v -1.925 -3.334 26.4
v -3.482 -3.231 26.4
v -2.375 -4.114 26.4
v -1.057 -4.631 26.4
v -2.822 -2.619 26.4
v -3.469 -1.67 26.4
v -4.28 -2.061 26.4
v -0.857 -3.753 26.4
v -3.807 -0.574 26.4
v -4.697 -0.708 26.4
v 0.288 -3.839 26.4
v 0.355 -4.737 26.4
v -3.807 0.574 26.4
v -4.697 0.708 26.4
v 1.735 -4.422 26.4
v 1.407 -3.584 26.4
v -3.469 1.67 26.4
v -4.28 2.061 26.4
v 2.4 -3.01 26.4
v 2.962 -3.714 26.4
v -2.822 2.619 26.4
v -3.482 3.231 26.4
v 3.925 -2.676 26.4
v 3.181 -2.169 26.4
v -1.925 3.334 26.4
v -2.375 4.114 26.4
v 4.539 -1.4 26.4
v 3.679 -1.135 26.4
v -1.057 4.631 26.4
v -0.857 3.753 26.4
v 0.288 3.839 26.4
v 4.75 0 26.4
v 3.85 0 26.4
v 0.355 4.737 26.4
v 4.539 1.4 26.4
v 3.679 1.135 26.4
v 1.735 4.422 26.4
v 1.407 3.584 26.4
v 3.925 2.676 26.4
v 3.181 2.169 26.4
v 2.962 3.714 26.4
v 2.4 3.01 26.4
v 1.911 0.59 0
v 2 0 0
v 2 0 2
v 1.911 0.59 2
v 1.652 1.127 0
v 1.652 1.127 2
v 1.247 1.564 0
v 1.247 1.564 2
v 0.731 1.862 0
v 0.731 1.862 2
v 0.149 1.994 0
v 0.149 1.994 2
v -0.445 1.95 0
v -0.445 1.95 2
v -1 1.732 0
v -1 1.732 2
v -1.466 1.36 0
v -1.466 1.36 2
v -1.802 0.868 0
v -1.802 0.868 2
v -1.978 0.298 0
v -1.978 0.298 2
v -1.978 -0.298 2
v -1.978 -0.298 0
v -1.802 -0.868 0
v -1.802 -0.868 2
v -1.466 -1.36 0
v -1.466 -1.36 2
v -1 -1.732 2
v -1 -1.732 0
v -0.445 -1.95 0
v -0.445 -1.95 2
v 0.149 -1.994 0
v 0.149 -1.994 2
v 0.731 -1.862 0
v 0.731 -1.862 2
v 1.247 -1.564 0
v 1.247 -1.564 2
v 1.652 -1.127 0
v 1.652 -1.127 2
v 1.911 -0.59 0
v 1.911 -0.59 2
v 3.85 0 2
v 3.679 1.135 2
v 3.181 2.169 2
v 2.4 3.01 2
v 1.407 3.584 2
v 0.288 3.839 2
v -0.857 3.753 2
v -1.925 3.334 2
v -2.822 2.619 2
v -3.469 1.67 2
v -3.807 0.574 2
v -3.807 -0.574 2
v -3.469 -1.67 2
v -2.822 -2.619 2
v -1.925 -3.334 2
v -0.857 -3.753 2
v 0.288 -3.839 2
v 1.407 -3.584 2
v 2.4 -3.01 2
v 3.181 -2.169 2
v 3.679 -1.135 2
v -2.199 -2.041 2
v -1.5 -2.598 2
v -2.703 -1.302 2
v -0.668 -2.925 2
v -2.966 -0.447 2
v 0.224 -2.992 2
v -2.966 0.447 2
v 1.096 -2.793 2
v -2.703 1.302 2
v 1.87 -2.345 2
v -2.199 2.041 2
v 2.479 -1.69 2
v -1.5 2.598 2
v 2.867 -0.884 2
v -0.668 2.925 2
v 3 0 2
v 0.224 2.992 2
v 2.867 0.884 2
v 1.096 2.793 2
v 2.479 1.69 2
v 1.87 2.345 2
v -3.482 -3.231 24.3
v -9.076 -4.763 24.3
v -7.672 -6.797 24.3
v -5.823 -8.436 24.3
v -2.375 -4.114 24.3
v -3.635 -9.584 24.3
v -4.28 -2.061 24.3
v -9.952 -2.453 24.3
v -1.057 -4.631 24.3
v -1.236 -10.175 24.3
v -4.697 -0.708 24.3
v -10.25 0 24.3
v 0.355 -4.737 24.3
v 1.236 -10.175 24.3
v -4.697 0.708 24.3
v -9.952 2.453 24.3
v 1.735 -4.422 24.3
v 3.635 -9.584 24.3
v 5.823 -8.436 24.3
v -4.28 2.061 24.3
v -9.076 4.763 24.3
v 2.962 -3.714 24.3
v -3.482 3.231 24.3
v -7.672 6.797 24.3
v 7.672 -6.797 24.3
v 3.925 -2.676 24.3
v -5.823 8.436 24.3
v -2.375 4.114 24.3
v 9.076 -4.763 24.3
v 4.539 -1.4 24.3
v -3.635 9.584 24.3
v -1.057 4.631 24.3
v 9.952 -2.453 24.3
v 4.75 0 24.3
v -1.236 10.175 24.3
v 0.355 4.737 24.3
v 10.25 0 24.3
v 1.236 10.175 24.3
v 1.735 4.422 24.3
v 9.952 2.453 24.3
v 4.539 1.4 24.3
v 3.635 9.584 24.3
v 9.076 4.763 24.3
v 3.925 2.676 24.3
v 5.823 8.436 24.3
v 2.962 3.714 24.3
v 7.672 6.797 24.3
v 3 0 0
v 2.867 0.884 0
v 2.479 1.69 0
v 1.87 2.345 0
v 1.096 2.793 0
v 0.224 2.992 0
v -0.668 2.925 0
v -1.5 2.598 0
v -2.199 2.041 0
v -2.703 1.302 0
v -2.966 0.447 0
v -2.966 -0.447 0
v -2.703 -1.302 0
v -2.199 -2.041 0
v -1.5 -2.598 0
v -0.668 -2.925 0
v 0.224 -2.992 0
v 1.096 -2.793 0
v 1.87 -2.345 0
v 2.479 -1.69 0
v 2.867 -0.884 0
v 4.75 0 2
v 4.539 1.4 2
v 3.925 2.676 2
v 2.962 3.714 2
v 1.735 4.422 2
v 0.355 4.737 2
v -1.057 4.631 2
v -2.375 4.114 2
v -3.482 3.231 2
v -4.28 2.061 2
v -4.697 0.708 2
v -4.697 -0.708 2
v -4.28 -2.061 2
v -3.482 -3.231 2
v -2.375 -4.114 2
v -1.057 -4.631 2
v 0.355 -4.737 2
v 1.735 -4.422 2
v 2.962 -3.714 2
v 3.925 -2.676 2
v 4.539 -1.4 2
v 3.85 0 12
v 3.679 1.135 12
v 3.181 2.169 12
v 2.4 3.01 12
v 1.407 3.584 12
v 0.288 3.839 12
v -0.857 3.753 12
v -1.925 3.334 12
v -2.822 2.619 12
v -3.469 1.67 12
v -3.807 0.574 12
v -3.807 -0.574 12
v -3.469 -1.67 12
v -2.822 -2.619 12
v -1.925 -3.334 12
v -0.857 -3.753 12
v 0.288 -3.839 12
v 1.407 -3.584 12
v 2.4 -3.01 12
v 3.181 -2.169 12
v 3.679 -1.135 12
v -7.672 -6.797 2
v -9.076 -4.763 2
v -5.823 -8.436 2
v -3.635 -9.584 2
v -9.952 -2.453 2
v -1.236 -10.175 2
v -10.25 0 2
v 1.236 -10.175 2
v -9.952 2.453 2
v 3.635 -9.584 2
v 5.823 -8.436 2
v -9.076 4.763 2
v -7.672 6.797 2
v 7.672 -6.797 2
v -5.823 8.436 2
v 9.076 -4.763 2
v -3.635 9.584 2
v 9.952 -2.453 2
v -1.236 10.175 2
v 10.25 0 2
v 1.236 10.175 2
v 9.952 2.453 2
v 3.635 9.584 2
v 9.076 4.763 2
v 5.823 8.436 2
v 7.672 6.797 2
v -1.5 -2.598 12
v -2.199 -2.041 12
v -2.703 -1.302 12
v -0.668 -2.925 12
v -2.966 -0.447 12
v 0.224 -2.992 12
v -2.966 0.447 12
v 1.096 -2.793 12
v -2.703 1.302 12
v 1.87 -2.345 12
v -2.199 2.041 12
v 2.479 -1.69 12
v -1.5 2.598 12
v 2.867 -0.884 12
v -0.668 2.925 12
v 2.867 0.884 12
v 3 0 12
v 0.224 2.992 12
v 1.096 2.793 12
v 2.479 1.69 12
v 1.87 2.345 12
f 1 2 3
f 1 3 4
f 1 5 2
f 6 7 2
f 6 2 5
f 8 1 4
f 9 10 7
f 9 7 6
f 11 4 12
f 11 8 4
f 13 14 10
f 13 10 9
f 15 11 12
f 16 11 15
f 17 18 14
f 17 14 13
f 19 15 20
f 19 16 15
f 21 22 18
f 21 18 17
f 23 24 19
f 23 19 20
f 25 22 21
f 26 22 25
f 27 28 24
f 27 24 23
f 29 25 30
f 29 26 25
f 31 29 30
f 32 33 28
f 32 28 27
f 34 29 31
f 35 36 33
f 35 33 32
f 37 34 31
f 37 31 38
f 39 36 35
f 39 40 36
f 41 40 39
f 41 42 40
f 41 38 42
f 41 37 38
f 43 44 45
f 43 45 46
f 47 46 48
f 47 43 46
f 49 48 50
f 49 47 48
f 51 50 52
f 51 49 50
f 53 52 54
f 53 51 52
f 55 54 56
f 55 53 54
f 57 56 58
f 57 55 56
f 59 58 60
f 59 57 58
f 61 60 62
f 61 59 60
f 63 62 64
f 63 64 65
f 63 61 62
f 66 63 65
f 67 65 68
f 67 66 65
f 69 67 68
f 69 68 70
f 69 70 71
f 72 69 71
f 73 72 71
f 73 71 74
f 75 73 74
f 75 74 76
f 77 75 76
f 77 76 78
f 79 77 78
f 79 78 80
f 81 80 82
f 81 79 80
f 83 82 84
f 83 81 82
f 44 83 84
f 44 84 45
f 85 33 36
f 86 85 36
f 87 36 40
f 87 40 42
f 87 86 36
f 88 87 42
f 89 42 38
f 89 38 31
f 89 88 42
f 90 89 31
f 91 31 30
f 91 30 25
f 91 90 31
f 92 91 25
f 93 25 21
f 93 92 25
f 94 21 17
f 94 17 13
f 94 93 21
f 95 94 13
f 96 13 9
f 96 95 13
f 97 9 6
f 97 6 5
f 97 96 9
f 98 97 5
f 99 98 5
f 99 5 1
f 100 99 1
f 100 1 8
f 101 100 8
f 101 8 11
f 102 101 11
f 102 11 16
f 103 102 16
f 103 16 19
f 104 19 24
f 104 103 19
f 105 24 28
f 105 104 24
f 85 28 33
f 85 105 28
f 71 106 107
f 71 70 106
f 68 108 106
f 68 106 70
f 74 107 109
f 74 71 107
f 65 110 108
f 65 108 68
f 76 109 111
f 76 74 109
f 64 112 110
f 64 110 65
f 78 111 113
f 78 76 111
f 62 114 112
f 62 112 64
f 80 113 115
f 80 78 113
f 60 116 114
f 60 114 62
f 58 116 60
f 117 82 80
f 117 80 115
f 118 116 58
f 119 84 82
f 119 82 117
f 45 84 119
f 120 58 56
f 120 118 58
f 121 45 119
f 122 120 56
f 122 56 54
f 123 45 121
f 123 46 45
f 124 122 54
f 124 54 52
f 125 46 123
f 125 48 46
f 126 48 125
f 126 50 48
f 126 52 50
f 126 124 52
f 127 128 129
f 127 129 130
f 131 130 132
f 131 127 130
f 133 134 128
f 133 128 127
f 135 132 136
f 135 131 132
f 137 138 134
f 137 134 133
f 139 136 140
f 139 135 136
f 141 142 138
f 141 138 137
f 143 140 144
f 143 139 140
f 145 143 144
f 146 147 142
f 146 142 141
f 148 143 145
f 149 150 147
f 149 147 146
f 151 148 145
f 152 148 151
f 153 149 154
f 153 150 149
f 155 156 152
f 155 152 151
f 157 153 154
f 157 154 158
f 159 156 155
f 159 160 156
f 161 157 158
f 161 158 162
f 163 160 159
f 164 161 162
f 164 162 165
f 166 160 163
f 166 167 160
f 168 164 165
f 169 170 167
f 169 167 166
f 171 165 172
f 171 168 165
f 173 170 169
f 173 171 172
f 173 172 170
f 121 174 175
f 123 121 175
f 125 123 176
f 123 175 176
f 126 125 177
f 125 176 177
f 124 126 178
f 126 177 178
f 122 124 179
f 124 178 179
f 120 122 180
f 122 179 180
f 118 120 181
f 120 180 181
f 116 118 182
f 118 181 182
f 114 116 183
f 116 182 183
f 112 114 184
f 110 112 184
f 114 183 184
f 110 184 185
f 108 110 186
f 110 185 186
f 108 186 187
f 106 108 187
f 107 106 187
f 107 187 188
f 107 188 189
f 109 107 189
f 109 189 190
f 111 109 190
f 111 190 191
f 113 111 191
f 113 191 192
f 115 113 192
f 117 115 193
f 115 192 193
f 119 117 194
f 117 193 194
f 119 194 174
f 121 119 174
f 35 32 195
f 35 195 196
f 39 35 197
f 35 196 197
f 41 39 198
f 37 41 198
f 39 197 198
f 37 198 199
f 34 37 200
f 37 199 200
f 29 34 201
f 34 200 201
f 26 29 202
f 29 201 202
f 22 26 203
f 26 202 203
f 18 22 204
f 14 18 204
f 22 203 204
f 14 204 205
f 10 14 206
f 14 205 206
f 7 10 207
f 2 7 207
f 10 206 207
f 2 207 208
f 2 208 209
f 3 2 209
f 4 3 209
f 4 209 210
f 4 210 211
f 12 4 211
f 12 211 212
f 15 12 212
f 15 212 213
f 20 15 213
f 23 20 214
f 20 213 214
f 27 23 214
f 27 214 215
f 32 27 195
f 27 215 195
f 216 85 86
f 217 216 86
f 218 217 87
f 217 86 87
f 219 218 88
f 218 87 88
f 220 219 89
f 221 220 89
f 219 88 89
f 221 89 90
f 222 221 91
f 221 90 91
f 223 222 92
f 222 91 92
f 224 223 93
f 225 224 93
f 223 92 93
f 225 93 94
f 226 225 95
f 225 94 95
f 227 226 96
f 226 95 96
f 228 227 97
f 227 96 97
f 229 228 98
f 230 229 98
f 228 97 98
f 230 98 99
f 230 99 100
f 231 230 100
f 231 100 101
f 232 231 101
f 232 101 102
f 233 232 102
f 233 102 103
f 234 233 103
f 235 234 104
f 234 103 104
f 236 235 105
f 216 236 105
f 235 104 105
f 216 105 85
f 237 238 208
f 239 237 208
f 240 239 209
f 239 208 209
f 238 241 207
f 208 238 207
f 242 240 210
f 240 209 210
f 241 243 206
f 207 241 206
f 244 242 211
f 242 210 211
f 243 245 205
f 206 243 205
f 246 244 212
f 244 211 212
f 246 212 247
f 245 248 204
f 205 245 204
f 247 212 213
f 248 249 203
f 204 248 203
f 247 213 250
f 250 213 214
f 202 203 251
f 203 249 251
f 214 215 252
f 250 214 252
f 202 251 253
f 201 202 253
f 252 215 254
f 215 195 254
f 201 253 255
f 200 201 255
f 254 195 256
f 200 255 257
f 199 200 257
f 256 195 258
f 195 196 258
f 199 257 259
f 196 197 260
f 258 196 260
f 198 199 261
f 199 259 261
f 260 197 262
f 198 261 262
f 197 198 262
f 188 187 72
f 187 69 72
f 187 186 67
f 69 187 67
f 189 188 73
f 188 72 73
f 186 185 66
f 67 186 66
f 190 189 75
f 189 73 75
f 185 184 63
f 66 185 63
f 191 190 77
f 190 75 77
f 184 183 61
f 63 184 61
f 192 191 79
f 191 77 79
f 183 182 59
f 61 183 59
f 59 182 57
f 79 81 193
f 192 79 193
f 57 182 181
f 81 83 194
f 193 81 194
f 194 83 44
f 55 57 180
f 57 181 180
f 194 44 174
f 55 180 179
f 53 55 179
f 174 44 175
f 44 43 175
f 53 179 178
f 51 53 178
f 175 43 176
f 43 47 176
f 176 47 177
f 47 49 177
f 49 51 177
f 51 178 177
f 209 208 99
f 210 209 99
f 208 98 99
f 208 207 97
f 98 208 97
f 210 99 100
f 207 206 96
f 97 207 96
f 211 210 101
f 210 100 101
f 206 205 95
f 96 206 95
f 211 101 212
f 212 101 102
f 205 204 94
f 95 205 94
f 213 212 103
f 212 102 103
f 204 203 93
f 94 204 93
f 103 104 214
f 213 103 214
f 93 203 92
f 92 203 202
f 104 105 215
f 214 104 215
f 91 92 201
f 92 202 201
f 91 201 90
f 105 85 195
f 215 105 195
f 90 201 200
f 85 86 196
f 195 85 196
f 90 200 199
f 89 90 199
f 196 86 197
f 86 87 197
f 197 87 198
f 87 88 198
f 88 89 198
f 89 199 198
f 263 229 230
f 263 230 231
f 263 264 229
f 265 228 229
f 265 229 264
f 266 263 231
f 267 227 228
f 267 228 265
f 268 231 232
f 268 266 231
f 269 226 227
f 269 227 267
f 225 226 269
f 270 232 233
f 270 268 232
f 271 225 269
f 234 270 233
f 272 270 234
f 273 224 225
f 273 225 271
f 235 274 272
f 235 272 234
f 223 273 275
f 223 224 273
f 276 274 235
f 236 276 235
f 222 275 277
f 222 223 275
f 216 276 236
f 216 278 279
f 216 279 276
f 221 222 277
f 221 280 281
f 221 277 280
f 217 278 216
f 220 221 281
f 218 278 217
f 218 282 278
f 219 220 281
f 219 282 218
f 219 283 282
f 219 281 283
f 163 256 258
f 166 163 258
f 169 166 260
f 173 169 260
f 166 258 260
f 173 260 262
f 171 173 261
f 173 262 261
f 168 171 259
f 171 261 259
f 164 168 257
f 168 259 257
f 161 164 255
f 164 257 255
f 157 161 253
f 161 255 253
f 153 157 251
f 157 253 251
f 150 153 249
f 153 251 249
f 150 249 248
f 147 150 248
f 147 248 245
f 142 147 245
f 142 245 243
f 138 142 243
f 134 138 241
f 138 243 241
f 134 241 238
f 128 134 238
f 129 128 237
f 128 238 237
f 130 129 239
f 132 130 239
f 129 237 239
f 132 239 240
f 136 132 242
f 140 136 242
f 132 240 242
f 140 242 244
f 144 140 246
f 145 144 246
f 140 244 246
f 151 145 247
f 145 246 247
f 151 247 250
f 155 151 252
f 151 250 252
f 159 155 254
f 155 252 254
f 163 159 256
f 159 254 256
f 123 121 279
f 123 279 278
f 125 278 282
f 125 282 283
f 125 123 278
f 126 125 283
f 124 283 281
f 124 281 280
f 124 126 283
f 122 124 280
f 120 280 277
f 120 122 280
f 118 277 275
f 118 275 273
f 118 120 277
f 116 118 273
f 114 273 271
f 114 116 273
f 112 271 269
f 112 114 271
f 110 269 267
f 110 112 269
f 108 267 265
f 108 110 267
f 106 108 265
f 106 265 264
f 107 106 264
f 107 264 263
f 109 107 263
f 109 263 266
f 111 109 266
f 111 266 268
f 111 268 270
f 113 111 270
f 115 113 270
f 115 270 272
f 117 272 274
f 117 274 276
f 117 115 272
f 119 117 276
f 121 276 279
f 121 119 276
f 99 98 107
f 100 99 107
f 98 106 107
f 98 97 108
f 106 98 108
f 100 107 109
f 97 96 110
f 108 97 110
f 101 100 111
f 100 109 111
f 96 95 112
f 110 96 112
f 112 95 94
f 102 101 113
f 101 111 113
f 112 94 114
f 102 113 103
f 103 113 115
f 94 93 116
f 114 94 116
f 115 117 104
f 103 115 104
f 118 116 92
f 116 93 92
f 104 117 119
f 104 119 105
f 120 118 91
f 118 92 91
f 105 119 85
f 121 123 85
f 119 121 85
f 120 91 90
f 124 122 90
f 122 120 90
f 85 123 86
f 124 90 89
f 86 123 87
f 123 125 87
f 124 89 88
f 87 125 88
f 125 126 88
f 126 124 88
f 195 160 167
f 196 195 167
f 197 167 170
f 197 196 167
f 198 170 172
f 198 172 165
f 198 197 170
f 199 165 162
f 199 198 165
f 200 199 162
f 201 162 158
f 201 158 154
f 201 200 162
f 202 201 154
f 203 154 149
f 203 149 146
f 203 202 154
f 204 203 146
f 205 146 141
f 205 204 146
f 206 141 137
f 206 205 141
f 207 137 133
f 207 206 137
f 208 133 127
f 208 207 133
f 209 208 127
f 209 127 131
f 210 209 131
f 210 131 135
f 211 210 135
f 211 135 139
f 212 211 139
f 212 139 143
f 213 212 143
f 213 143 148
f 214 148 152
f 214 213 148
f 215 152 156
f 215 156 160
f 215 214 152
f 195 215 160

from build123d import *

# Parameters (mm, degrees)
F0_R     = 3
F0_R_2   = 2
F1_DEPTH = 2
F2_R     = 4.75
F2_R_2   = 3.85
F3_DEPTH = 24.4
F2_R_3   = 3
F4_DEPTH = 10
F2_R_4   = 10.25
F5_DEPTH = 22.3


with BuildPart() as f1:
    # F0 (on Top) → F1 (new body)
    with BuildSketch(Plane.XY):
        Circle(F0_R)
        Circle(F0_R_2, mode=Mode.SUBTRACT)
    extrude(amount=F1_DEPTH)


with BuildPart() as f3:
    # F2 (on face) → F3 (new body)
    with BuildSketch(Plane.XY.offset(2)):
        Circle(F2_R)
        Circle(F2_R_2, mode=Mode.SUBTRACT)
    extrude(amount=F3_DEPTH)


with BuildPart() as f4:
    # F2 (on face) → F4 (new body)
    with BuildSketch(Plane.XY.offset(2)):
        Circle(F2_R_2)
        Circle(F2_R_3, mode=Mode.SUBTRACT)
    extrude(amount=F4_DEPTH)


with BuildPart() as f5:
    # F2 (on face) → F5 (new body)
    with BuildSketch(Plane.XY.offset(2)):
        Circle(F2_R_4)
        Circle(F2_R, mode=Mode.SUBTRACT)
    extrude(amount=F5_DEPTH)


solid = Compound([f1.part, f3.part, f4.part, f5.part])
